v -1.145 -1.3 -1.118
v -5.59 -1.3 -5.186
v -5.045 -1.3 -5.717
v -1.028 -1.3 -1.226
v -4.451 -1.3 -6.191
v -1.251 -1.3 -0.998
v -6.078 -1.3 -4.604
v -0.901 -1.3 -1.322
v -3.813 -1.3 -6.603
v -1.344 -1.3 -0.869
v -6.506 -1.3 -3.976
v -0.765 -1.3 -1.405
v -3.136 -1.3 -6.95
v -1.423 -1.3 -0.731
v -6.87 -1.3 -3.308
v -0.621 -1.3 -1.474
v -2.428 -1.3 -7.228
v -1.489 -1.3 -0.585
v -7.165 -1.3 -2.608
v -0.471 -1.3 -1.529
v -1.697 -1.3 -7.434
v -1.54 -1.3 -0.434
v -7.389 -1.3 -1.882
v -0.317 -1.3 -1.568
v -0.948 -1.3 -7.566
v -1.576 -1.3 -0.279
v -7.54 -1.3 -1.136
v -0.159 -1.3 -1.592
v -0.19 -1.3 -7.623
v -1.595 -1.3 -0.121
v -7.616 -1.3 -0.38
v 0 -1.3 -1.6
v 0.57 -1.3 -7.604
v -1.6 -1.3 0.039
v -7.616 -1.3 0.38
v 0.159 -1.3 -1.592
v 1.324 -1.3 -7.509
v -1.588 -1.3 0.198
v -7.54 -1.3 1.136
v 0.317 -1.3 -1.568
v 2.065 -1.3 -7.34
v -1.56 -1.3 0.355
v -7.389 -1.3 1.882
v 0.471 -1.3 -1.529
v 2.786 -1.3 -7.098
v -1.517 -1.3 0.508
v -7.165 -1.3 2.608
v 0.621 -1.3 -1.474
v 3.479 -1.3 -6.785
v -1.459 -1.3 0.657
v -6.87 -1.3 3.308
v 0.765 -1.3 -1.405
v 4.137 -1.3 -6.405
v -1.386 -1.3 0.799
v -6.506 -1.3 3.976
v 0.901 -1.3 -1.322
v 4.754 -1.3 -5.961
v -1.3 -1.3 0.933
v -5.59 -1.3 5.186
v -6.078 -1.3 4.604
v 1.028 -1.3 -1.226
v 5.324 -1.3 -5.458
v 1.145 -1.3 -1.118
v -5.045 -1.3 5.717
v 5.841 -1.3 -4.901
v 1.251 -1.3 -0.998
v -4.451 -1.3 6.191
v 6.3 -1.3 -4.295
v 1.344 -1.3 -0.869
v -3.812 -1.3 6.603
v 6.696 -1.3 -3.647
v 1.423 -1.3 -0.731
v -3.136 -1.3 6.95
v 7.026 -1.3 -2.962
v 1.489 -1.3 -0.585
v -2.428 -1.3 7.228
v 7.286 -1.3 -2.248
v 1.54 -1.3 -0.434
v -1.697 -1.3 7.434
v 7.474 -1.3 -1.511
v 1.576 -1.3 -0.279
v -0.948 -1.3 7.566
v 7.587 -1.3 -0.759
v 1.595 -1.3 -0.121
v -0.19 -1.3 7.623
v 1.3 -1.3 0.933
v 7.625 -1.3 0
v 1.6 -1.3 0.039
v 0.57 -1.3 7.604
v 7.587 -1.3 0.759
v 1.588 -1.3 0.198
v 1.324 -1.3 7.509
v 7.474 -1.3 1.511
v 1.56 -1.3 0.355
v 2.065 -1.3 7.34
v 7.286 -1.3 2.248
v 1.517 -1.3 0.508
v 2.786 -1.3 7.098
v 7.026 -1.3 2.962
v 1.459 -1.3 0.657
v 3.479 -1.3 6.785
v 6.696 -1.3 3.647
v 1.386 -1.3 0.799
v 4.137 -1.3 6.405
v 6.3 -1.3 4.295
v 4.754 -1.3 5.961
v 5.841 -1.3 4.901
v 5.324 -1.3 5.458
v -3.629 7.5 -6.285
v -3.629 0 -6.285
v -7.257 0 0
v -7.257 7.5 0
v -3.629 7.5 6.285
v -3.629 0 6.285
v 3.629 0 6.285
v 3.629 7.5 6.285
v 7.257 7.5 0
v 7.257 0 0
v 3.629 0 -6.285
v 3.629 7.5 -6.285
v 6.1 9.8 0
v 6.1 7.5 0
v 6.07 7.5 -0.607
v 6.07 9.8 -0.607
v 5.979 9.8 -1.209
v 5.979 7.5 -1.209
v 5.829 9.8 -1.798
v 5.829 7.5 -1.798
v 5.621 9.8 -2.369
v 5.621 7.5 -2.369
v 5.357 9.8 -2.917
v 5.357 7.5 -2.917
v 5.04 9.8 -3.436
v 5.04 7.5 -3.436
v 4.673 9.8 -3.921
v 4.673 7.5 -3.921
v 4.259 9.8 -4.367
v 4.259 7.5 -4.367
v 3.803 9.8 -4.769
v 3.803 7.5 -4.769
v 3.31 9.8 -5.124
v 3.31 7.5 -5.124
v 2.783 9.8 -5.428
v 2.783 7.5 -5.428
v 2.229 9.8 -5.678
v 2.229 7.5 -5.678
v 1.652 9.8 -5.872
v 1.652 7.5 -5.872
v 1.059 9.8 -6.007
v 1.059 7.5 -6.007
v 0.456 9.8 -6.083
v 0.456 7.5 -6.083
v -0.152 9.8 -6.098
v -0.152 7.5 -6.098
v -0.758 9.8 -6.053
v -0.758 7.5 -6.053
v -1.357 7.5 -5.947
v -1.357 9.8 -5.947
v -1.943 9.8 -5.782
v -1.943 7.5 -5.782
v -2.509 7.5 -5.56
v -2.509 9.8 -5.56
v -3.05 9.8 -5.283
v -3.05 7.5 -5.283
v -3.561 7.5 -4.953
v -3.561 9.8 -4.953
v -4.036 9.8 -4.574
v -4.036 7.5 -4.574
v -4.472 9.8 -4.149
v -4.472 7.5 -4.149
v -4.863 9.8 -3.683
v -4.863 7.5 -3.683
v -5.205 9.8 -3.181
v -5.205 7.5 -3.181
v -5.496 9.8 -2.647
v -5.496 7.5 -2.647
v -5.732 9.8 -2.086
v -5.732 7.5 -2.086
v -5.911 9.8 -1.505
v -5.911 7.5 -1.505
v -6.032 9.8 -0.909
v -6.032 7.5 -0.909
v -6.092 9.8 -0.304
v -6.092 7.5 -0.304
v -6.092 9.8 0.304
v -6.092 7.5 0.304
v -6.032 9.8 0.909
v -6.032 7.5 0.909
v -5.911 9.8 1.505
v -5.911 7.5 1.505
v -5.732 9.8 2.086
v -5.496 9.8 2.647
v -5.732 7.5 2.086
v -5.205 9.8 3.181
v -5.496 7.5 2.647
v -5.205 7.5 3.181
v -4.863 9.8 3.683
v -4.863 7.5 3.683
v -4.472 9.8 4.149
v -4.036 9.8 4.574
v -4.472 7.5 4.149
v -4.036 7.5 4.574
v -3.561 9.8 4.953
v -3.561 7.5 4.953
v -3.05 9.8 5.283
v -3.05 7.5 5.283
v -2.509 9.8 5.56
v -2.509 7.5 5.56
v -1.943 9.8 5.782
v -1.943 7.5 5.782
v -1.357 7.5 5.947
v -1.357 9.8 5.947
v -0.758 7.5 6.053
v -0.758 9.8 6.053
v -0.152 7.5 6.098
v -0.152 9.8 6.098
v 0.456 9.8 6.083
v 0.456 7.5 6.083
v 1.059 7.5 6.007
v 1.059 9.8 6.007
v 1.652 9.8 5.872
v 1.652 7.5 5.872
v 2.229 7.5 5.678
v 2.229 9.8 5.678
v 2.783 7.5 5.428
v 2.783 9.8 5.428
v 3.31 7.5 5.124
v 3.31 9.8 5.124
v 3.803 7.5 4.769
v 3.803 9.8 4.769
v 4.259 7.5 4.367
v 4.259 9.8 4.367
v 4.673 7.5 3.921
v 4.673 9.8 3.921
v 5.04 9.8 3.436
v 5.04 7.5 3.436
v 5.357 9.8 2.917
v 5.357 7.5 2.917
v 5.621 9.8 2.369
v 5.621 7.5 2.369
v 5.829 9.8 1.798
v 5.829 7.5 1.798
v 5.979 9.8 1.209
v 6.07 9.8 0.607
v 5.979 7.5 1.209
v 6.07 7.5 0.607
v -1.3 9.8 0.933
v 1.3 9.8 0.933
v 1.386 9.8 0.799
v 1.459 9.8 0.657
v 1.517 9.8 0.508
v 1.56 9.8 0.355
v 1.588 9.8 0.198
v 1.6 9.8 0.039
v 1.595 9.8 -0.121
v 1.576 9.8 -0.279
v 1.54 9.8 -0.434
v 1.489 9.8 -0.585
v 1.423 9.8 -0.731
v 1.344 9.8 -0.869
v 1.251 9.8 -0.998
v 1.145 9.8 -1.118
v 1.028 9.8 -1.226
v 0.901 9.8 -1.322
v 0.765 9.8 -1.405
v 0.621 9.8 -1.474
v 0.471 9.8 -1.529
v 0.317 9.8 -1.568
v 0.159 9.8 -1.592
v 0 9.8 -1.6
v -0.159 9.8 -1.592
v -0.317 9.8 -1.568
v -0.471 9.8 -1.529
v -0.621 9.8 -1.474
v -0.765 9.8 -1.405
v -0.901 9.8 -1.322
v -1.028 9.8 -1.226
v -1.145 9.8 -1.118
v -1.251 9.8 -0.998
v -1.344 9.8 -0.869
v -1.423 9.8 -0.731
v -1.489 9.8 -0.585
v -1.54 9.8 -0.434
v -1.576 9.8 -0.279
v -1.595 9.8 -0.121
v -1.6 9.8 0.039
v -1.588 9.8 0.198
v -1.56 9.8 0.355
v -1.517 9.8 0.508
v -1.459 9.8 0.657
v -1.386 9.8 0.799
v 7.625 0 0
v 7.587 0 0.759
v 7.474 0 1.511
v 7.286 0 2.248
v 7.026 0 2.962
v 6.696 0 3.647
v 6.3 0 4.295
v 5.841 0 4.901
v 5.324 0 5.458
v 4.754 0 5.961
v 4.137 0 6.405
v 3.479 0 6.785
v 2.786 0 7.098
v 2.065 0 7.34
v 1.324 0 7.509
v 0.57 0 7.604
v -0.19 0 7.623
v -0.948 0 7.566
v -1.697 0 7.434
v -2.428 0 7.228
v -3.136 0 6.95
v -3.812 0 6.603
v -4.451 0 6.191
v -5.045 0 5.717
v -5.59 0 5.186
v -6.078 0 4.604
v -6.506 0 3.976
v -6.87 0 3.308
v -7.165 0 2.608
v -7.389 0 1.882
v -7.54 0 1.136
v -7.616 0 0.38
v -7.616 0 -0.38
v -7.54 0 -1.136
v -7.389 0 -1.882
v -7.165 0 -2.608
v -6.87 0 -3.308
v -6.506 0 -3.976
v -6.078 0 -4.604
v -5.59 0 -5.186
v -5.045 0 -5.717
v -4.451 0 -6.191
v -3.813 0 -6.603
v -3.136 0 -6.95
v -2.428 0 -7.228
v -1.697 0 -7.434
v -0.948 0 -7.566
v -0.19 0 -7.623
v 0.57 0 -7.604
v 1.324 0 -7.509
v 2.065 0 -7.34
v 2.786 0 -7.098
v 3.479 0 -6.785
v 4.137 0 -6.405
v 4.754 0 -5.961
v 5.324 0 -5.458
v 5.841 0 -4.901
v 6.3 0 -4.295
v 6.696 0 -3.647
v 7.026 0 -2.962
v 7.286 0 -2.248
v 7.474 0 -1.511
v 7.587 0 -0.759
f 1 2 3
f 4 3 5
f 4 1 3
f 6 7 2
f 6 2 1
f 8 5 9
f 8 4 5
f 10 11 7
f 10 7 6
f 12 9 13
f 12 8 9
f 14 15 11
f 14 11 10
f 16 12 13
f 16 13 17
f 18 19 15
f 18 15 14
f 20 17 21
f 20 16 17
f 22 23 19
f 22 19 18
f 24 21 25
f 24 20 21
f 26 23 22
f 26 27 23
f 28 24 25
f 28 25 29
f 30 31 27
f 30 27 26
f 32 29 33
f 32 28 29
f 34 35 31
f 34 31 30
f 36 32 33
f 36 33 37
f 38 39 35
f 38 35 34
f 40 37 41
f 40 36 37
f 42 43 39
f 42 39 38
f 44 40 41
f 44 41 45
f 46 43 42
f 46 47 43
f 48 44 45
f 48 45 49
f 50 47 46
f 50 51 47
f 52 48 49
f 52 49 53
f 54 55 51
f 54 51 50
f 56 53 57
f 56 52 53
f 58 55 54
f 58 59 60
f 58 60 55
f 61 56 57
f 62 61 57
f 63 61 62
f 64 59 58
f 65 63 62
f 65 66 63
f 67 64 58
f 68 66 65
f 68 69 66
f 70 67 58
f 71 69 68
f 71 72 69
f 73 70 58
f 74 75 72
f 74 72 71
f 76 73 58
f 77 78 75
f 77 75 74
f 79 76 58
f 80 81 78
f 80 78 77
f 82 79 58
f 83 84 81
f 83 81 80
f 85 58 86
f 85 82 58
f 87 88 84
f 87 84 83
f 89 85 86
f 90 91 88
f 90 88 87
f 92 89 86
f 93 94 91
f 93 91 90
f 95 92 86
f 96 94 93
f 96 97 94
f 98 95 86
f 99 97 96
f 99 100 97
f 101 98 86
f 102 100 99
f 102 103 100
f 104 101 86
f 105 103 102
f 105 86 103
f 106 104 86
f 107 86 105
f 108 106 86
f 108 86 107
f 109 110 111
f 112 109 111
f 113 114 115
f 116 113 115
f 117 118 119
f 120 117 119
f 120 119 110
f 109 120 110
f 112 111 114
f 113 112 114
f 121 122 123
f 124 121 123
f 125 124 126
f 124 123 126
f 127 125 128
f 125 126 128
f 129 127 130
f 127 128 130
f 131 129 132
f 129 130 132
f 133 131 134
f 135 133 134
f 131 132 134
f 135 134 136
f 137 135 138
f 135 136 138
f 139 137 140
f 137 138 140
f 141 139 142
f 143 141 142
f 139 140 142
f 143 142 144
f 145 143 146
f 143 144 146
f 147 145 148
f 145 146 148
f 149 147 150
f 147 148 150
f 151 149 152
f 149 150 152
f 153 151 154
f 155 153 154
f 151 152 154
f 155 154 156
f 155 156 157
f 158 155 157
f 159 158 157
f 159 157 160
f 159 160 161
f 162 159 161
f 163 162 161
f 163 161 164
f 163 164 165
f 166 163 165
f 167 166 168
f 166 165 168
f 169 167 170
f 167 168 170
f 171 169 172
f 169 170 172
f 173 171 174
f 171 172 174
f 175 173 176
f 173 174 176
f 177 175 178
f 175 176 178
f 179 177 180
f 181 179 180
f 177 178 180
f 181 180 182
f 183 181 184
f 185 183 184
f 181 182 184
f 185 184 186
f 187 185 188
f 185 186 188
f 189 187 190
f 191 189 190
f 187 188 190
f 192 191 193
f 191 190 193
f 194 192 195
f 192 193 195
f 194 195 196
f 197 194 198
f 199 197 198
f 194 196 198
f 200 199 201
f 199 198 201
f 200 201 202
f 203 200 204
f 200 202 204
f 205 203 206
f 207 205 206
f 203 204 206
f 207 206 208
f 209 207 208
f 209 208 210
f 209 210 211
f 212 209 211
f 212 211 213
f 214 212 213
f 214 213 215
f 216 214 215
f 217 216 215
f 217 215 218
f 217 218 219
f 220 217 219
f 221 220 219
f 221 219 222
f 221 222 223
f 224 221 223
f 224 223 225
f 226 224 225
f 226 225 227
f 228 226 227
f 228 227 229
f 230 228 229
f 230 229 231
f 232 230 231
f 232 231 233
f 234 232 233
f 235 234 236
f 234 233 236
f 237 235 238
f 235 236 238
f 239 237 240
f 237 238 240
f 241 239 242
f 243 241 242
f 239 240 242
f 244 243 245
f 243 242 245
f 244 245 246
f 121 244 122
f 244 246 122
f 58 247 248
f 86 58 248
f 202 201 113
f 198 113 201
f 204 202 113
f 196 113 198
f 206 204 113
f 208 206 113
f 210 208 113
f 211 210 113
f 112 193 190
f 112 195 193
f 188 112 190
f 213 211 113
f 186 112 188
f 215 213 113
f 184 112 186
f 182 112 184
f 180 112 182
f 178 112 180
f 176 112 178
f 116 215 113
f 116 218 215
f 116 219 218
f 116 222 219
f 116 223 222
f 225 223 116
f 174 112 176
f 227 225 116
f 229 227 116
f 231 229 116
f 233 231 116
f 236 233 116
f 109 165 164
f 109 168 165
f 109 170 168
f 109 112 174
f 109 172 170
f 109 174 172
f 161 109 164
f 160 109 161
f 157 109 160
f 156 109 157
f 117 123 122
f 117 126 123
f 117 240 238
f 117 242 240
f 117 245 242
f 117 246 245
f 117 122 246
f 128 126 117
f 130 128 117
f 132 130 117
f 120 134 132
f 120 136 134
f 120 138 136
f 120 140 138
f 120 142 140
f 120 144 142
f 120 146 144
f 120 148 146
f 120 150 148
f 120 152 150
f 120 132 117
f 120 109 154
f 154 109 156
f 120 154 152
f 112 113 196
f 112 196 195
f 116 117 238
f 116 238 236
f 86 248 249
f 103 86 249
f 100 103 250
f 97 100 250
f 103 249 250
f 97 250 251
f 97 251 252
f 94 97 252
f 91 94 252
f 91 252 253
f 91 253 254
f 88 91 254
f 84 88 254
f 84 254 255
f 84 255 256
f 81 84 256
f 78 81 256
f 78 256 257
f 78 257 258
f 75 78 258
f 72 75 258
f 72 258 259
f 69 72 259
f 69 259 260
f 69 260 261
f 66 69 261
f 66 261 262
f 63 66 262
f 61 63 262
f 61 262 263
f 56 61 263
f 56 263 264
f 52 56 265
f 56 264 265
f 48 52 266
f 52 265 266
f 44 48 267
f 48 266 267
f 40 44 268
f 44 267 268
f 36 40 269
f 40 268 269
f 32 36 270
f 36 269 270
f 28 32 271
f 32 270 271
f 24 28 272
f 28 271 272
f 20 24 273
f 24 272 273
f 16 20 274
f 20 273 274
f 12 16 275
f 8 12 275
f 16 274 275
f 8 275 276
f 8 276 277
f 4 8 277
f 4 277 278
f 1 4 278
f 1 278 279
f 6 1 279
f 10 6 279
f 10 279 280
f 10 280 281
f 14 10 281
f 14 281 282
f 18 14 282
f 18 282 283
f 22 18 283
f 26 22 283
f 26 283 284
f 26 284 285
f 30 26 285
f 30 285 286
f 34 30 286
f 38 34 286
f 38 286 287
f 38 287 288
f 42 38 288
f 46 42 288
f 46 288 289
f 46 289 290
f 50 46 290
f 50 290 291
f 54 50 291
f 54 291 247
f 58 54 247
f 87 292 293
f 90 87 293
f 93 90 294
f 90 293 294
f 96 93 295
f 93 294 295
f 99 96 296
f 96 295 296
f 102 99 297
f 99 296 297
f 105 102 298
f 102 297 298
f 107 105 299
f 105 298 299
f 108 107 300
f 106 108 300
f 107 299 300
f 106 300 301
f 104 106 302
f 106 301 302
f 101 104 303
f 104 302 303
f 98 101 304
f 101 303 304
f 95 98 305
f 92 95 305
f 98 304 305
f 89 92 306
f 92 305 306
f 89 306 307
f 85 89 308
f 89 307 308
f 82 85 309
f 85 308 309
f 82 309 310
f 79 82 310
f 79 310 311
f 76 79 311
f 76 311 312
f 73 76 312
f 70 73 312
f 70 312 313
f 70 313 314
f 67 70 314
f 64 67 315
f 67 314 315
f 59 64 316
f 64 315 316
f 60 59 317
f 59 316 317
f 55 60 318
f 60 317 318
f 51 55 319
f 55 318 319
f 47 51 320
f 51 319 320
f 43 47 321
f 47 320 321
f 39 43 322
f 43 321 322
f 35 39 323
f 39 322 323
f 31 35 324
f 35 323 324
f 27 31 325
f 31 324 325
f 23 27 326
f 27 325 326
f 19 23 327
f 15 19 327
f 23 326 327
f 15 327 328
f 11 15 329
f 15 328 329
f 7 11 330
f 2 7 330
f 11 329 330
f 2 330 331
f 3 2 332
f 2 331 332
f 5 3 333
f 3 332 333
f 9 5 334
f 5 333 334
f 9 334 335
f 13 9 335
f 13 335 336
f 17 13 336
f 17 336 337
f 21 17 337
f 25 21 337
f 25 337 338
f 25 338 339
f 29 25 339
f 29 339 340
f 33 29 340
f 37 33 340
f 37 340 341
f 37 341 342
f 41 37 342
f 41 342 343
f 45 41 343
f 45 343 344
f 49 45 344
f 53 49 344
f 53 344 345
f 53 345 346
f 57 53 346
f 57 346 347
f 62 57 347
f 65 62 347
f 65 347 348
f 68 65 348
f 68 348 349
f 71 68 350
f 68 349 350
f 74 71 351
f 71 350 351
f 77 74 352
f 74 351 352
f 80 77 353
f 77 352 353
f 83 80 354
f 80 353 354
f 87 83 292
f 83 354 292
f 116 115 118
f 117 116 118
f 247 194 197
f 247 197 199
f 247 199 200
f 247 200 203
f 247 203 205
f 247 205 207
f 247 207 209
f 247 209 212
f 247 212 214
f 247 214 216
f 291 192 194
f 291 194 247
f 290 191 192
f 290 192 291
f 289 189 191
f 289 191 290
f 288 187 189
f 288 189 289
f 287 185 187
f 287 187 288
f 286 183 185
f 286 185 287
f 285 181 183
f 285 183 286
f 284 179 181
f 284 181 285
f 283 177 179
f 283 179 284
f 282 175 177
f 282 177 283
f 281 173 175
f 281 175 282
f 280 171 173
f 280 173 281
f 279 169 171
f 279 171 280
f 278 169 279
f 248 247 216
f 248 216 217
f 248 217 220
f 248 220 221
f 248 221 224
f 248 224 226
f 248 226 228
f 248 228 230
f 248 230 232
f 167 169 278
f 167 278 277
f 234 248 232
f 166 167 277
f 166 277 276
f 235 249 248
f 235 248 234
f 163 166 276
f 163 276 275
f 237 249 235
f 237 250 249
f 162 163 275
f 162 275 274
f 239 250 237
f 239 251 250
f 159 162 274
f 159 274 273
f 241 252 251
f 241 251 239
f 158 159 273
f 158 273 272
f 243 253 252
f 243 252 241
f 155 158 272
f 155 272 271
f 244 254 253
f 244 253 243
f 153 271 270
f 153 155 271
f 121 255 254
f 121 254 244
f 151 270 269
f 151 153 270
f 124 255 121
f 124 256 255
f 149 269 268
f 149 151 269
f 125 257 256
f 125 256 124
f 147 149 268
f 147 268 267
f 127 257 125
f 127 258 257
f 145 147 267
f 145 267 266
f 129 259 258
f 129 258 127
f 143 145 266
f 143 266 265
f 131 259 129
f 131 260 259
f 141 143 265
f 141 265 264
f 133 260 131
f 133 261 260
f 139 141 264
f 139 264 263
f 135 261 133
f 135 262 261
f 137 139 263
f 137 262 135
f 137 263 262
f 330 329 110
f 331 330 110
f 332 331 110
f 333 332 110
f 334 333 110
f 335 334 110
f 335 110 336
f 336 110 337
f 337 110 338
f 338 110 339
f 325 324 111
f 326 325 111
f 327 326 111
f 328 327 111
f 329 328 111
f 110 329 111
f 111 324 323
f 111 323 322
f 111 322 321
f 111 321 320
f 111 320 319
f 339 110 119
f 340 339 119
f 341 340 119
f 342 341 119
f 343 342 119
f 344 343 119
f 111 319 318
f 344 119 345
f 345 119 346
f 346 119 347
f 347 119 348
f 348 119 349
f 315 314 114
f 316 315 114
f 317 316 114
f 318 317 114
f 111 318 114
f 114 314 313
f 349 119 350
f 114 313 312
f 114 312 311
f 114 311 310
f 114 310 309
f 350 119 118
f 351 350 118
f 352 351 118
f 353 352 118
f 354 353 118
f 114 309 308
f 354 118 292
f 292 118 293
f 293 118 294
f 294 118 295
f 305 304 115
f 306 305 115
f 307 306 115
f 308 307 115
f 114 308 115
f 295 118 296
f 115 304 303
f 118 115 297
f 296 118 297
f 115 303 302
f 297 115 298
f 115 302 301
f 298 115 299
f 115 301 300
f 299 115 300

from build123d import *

# Parameters (mm, degrees)
BOSS_EXTRUDE1_DEPTH = 7.5
SKETCH2_R           = 6.1
BOSS_EXTRUDE2_DEPTH = 2.3
SKETCH3_R           = 7.625
BOSS_EXTRUDE3_DEPTH = 1.3
CUT_EXTRUDE1_DEPTH  = 12.1


with BuildPart() as part:
    # Sketch1 → Boss-Extrude1 (new body)
    with BuildSketch(Plane(origin=(0, 0, 0), x_dir=(1, 0, 0), z_dir=(0, 1, 0))):
        Polygon((7.257292884, 0), (3.628646442, 6.285), (-3.628646442, 6.285), (-7.257292884, 0), (-3.628646442, -6.285), (3.628646442, -6.285), align=None)
    extrude(amount=BOSS_EXTRUDE1_DEPTH)

    # Sketch2 → Boss-Extrude2 (add)
    with BuildSketch(Plane(origin=(0, 7.5, 0), x_dir=(1, 0, 0), z_dir=(0, 1, 0))):
        Circle(SKETCH2_R)
    extrude(amount=BOSS_EXTRUDE2_DEPTH)

    # Sketch3 → Boss-Extrude3 (add)
    with BuildSketch(Plane.XZ):
        Circle(SKETCH3_R)
    extrude(amount=BOSS_EXTRUDE3_DEPTH)

    # Sketch4 → Cut-Extrude1 (cut, through all)
    with BuildSketch(Plane(origin=(0, 9.8, 0), x_dir=(1, 0, 0), z_dir=(0, 1, 0))):
        with BuildLine():
            Line((-1.3, -0.932737905), (1.3, -0.932737905))
            ThreePointArc((1.3, -0.932737905), (0, 1.6), (-1.3, -0.932737905))
        make_face()
    extrude(amount=-CUT_EXTRUDE1_DEPTH, mode=Mode.SUBTRACT)


solid = part.part
